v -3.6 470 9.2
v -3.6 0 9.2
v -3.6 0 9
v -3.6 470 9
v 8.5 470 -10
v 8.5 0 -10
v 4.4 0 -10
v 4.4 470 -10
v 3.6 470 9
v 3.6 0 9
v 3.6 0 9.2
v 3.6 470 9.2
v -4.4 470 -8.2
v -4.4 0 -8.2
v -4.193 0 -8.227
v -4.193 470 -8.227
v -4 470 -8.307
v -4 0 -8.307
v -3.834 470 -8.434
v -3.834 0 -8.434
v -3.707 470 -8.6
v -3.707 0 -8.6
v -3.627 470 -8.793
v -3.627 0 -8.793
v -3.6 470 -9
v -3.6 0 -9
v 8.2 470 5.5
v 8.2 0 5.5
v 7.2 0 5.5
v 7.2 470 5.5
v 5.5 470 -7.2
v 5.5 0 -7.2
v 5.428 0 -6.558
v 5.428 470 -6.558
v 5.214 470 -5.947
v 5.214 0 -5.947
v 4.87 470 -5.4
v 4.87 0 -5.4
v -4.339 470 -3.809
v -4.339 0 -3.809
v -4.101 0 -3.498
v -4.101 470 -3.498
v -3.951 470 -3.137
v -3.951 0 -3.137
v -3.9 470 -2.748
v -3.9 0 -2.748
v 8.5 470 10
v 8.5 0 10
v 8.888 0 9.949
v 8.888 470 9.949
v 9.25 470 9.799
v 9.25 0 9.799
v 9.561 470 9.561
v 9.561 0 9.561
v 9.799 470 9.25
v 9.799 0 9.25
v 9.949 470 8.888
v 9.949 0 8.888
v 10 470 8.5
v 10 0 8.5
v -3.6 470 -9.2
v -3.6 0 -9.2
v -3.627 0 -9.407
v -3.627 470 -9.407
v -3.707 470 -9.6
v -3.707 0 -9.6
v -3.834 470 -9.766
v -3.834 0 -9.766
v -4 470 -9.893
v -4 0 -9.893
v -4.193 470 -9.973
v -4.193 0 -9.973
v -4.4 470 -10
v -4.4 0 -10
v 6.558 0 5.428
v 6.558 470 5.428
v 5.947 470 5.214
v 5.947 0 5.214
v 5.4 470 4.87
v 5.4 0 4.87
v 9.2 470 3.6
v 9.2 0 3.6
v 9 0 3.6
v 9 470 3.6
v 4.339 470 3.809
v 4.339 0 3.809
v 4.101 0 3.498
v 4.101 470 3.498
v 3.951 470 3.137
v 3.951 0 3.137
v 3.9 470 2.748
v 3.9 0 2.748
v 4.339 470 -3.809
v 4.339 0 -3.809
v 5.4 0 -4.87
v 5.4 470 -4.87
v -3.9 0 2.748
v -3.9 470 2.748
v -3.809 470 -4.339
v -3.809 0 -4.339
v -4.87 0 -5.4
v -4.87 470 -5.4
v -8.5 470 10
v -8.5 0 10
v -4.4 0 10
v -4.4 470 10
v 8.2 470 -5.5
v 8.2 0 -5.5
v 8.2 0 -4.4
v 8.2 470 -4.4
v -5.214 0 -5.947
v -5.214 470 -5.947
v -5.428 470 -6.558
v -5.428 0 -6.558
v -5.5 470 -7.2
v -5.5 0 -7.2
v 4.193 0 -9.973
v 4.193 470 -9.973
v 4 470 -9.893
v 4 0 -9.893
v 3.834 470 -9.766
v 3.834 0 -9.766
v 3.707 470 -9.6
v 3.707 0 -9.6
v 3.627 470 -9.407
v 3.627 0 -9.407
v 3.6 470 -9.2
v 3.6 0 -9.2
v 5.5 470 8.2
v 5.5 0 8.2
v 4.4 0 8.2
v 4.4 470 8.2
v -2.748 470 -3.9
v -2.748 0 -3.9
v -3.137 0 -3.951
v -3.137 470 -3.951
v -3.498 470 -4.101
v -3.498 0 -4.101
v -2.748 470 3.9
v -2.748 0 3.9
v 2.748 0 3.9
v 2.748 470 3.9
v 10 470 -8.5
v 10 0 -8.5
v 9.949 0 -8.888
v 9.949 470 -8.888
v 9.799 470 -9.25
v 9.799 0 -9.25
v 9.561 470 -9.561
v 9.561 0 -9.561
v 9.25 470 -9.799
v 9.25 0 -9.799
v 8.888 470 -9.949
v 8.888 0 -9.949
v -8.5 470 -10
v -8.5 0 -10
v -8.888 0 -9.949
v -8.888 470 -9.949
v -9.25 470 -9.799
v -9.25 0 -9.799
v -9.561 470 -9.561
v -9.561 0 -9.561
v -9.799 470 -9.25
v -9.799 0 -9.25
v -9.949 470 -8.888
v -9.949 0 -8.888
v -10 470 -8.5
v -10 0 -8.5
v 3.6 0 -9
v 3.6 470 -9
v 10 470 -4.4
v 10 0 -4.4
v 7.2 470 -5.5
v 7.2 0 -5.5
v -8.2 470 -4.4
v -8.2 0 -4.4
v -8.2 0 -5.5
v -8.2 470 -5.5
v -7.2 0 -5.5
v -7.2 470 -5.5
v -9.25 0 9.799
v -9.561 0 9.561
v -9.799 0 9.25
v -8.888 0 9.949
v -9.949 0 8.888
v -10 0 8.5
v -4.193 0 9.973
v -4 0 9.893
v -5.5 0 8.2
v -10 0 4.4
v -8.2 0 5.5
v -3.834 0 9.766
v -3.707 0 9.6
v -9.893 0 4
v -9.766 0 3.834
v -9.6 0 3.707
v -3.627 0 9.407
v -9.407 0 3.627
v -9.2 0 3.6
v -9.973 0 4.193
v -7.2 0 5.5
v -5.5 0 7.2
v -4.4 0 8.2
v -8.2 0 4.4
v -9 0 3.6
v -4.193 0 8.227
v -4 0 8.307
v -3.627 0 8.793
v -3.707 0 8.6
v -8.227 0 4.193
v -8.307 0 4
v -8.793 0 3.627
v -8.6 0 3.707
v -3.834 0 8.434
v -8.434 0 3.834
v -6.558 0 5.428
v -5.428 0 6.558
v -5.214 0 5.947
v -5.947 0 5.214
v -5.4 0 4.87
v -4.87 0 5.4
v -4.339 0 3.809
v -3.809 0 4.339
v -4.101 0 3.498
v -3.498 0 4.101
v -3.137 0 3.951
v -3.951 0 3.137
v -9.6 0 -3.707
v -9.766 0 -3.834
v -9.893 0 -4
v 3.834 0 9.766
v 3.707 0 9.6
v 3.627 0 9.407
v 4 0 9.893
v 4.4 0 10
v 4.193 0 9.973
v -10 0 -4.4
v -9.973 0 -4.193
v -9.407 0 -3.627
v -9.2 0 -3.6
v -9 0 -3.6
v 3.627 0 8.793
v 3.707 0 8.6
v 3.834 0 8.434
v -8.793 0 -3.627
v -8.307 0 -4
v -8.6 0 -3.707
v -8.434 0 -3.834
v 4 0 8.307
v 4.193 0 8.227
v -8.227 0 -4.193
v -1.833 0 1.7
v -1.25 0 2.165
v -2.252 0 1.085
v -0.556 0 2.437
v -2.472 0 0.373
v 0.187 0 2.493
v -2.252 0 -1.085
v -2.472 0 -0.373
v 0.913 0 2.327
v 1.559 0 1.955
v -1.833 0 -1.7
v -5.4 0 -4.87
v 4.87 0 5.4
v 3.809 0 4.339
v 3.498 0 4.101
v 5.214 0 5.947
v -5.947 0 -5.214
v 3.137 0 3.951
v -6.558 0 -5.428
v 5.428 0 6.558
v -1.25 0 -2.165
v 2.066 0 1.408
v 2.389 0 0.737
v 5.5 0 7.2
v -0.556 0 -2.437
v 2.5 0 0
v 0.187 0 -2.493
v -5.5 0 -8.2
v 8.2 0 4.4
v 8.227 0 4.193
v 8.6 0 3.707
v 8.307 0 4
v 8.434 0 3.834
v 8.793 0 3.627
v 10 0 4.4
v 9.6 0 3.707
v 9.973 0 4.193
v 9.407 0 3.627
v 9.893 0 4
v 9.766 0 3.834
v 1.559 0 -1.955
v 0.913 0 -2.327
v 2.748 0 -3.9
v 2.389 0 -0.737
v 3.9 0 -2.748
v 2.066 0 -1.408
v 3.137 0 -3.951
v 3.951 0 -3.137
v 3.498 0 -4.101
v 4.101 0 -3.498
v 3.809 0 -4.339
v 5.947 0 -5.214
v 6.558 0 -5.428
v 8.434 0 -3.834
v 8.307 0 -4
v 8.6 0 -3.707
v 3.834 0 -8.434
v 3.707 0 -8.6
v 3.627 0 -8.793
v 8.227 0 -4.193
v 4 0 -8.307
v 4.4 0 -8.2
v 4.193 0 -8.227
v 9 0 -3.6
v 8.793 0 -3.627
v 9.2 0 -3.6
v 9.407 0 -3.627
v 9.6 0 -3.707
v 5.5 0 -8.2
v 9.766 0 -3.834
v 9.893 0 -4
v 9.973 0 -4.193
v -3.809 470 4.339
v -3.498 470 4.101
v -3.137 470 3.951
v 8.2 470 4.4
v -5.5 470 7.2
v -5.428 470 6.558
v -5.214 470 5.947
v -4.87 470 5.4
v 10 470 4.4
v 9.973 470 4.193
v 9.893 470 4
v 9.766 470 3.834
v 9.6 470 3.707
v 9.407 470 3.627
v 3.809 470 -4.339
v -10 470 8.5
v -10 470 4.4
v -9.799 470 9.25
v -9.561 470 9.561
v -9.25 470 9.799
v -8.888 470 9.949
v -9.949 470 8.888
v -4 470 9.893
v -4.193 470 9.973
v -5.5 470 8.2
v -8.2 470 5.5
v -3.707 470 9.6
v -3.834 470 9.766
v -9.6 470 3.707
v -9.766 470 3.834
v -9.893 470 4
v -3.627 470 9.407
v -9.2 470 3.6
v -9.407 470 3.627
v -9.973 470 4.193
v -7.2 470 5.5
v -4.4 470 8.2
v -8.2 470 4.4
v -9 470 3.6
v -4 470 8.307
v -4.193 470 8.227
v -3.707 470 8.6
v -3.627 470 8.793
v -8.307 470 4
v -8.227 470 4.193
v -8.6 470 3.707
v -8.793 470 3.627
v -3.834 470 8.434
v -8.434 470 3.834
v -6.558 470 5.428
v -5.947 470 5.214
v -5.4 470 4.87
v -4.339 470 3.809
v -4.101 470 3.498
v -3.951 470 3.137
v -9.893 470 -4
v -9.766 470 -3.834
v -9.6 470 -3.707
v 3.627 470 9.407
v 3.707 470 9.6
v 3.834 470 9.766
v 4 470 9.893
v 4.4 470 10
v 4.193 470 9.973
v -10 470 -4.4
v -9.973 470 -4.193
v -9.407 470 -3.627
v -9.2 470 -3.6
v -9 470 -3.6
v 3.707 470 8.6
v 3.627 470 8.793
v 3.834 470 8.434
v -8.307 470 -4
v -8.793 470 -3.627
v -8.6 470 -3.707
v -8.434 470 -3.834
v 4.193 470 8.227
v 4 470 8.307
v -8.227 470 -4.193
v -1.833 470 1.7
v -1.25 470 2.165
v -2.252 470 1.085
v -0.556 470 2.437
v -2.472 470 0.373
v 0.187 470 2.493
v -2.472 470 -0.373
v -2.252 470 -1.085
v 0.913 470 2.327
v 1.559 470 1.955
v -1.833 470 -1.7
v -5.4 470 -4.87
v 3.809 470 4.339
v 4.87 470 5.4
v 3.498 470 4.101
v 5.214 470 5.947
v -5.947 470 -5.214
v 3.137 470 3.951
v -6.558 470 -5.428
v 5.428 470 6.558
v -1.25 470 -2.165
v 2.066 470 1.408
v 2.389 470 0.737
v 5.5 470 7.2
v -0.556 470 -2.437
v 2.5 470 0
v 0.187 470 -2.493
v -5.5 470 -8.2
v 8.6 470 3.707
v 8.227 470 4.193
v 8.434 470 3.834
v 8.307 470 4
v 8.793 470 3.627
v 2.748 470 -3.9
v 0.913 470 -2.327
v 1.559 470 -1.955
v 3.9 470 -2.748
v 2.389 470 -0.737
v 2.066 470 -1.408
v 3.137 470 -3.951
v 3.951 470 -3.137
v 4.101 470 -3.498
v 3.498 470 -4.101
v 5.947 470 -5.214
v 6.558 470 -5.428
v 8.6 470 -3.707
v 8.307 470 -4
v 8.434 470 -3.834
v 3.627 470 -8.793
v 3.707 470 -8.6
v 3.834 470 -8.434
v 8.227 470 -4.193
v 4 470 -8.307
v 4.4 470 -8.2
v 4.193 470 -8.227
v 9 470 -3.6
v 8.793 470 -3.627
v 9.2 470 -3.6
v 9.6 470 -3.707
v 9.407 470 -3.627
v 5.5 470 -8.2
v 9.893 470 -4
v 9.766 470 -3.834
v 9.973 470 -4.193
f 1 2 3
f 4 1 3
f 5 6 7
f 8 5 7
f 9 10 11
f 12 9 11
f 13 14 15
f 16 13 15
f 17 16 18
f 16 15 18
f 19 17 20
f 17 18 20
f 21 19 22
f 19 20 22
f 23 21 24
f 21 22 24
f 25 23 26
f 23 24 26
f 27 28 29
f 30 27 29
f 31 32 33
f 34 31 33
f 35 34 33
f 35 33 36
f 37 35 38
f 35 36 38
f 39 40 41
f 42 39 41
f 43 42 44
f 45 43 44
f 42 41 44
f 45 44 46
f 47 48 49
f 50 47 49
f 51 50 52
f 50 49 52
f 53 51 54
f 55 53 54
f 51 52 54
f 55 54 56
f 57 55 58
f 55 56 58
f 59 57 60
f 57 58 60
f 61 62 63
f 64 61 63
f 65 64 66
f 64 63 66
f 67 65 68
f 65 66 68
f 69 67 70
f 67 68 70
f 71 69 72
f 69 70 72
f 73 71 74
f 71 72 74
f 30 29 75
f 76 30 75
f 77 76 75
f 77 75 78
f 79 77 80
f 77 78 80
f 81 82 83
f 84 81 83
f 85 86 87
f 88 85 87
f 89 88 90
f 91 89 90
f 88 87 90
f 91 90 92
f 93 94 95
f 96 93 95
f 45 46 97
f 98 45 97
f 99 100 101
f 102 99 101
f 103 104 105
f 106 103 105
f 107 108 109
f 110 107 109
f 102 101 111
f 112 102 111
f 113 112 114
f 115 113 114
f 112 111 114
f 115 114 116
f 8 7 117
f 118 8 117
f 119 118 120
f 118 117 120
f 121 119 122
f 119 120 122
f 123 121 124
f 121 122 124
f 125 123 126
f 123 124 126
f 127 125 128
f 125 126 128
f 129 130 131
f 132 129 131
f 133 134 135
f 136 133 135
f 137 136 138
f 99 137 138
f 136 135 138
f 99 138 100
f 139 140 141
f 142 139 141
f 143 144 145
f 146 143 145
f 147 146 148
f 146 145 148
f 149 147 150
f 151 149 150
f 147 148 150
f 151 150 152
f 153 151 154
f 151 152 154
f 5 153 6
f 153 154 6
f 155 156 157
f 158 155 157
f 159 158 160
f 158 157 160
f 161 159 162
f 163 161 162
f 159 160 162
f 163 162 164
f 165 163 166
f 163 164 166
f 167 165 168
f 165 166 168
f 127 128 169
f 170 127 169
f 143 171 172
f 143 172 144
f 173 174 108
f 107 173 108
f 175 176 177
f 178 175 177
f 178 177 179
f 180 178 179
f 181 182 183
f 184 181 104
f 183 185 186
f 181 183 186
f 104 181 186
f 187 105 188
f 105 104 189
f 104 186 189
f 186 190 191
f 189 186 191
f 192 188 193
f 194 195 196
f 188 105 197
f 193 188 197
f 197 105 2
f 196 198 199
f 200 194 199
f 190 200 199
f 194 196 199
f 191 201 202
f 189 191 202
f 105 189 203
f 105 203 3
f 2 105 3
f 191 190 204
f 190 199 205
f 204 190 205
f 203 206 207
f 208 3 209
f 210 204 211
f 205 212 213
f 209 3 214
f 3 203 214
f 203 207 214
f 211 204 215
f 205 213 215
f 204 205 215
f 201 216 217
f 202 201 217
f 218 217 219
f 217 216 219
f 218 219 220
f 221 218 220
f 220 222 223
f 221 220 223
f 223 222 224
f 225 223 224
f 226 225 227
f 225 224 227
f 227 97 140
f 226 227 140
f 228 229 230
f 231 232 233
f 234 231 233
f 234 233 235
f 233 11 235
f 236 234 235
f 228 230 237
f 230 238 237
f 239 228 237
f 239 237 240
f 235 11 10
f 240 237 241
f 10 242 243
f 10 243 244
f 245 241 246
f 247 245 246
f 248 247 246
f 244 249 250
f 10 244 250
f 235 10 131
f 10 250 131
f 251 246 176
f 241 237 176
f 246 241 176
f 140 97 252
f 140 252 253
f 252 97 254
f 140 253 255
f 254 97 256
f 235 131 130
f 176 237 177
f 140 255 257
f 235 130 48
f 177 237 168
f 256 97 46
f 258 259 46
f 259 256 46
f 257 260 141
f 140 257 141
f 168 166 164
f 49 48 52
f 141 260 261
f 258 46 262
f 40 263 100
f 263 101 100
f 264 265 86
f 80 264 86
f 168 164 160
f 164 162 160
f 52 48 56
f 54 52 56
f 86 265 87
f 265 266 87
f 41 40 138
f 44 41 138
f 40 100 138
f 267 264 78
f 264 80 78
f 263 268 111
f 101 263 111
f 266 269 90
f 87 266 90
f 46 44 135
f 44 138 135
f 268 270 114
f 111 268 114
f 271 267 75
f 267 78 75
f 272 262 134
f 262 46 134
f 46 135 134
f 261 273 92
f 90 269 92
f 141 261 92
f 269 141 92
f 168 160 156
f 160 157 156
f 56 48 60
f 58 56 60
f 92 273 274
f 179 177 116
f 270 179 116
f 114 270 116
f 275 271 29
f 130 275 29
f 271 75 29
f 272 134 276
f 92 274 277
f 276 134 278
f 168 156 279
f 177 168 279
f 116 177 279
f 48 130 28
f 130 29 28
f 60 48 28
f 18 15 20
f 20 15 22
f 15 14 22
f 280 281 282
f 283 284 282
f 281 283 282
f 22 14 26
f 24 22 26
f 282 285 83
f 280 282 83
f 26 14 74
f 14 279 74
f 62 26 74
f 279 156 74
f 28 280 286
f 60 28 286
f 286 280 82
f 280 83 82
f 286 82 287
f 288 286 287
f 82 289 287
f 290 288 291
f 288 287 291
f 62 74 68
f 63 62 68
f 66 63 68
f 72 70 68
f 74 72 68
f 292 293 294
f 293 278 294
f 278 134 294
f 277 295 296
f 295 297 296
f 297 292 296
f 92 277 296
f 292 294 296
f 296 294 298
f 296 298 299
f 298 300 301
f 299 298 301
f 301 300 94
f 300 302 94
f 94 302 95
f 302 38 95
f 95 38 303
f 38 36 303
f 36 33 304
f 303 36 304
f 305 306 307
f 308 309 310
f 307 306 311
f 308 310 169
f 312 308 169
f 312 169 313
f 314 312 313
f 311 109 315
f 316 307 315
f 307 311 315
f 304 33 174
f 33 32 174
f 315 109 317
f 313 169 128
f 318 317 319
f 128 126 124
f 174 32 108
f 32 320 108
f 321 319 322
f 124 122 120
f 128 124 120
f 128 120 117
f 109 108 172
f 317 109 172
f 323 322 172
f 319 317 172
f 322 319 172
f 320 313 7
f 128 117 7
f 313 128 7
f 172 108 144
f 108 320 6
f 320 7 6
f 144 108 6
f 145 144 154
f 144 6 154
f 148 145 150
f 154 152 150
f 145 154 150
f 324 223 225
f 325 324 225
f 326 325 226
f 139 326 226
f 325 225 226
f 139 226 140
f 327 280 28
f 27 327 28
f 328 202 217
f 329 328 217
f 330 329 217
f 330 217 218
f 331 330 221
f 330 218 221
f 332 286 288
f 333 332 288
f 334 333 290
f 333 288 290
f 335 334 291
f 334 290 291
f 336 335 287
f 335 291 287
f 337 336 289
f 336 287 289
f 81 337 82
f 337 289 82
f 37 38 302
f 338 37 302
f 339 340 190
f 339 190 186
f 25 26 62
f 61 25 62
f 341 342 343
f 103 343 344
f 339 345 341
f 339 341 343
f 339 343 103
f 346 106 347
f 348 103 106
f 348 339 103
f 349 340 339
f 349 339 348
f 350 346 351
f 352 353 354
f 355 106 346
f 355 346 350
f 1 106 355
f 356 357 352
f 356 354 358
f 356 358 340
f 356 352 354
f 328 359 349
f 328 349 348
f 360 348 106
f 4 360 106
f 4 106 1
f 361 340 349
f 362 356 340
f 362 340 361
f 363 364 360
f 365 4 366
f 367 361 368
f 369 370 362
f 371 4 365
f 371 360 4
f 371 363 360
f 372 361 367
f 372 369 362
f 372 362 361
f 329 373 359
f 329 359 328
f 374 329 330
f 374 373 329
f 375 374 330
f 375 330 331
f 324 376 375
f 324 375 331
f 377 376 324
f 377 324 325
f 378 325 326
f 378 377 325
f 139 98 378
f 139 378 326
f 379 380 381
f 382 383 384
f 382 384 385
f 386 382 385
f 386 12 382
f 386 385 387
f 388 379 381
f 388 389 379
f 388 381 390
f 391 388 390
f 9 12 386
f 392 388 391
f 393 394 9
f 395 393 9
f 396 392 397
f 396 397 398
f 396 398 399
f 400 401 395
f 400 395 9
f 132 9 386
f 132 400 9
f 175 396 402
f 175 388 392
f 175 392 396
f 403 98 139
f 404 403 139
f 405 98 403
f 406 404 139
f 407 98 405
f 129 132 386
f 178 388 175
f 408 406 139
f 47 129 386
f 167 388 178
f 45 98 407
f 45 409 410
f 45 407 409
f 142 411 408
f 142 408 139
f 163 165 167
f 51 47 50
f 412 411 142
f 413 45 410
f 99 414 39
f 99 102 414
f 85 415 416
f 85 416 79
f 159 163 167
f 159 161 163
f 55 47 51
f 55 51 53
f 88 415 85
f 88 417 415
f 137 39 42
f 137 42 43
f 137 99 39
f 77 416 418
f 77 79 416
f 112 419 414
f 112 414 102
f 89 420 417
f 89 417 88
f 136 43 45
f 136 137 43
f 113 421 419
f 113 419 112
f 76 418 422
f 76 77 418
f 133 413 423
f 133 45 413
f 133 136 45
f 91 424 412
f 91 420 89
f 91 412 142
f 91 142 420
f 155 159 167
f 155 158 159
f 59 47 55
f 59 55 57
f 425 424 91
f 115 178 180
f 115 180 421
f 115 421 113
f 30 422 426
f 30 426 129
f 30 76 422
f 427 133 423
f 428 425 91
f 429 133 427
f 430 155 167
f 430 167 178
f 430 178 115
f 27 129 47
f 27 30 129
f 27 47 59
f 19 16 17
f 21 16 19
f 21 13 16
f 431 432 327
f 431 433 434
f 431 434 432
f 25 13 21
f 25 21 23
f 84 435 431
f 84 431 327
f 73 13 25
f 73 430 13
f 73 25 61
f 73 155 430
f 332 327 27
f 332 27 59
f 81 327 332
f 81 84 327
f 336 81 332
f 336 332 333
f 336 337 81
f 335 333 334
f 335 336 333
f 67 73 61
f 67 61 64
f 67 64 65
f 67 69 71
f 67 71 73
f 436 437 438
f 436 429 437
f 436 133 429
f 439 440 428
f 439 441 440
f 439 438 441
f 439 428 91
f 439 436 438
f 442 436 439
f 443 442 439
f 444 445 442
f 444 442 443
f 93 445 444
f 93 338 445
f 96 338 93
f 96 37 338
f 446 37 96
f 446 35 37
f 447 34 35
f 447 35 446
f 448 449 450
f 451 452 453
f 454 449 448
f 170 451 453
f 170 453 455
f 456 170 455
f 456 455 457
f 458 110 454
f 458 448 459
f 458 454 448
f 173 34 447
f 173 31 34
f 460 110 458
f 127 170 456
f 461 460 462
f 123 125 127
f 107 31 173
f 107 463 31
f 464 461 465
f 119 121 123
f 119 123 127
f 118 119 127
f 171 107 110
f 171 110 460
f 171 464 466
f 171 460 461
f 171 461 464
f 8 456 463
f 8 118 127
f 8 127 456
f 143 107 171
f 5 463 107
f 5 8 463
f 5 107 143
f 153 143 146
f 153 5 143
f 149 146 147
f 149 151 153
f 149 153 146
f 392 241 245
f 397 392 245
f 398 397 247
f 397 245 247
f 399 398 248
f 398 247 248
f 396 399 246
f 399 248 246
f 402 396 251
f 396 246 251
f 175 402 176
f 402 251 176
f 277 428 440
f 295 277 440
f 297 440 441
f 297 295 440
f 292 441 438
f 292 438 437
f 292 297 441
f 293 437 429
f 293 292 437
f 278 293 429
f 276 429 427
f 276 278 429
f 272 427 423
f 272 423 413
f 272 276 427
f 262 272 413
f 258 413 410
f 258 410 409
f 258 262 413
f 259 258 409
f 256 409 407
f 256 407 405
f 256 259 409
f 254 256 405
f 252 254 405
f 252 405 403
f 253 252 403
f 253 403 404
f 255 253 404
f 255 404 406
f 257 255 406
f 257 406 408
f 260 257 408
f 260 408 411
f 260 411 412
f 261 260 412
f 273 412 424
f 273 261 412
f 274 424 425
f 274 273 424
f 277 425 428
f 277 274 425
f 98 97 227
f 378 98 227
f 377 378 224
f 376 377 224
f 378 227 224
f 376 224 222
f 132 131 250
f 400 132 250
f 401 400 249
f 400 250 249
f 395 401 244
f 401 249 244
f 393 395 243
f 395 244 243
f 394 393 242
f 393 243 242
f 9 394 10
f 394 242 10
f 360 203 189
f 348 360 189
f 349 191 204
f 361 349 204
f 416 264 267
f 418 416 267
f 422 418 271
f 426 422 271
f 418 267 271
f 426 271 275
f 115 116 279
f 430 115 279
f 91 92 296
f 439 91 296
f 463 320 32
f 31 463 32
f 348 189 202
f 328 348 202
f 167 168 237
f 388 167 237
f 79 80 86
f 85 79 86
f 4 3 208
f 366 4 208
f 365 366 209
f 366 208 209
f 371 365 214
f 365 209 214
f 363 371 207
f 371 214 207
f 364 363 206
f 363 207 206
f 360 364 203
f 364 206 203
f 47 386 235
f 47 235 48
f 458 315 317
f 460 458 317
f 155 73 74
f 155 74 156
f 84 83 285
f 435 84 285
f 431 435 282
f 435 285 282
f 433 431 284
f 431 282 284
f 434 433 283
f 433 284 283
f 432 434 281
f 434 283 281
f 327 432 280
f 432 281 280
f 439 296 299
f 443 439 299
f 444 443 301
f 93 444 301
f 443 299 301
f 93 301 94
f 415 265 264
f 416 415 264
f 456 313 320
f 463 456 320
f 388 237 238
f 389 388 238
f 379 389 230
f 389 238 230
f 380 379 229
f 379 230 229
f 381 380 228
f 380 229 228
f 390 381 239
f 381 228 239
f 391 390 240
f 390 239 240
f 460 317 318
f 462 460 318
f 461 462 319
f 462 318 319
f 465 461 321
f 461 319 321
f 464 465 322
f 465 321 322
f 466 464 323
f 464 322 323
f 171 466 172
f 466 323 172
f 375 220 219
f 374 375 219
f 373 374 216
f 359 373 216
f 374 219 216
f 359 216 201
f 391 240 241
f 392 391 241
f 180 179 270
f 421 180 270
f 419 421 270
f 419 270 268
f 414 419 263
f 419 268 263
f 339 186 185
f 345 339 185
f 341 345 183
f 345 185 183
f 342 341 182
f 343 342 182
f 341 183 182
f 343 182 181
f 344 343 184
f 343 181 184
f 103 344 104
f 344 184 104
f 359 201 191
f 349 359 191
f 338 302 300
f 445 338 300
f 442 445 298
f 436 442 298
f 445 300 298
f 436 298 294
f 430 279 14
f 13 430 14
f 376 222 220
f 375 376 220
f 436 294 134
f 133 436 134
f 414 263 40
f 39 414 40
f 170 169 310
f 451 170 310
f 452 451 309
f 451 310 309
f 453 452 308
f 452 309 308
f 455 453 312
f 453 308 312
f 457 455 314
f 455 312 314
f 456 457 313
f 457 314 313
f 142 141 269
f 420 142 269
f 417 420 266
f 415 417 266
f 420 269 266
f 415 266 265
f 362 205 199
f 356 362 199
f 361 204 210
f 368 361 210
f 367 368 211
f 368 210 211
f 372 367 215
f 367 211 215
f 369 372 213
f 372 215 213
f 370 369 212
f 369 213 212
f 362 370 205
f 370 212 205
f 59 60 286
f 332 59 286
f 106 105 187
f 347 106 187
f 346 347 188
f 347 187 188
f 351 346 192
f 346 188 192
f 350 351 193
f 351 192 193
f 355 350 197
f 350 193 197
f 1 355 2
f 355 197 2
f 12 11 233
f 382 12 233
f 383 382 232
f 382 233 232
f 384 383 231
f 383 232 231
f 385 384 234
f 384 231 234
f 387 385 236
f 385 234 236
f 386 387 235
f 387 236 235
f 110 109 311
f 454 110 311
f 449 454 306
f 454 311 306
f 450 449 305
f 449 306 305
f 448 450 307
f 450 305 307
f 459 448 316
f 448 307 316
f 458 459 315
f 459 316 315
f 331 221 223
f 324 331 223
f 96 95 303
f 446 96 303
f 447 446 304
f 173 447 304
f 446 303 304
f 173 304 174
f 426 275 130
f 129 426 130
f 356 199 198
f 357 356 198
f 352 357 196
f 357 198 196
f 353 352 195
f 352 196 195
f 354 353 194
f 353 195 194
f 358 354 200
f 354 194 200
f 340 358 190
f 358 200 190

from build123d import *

# Parameters (mm, degrees)
SKETCH2_R           = 2.5
BOSS_EXTRUDE1_DEPTH = 470


with BuildPart() as part:
    # Sketch2 → Boss-Extrude1 (new body)
    with BuildSketch(Plane(origin=(0, 0, 0), x_dir=(1, 0, 0), z_dir=(0, 1, 0))):
        with BuildLine():
            Line((-5.4, 4.869669914), (-4.339339828, 3.809009742))
            ThreePointArc((-4.339339828, 3.809009742), (-4.014180701, 3.322374719), (-3.9, 2.748349571))
            Line((-3.9, 2.748349571), (-3.9, -2.748349571))
            ThreePointArc((-3.9, -2.748349571), (-4.014180701, -3.322374719), (-4.339339828, -3.809009742))
            Line((-4.339339828, -3.809009742), (-5.4, -4.869669914))
            ThreePointArc((-5.4, -4.869669914), (-6.246412561, -5.337861749), (-7.2, -5.5))
            Line((-7.2, -5.5), (-8.2, -5.5))
            Line((-8.2, -5.5), (-8.2, -4.4))
            ThreePointArc((-8.2, -4.4), (-8.434314575, -3.834314575), (-9, -3.6))
            Line((-9, -3.6), (-9.2, -3.6))
            ThreePointArc((-9.2, -3.6), (-9.765685425, -3.834314575), (-10, -4.4))
            Line((-10, -4.4), (-10, -8.5))
            ThreePointArc((-10, -8.5), (-9.560660172, -9.560660172), (-8.5, -10))
            Line((-8.5, -10), (-4.4, -10))
            ThreePointArc((-4.4, -10), (-3.834314575, -9.765685425), (-3.6, -9.2))
            Line((-3.6, -9.2), (-3.6, -9))
            ThreePointArc((-3.6, -9), (-3.834314575, -8.434314575), (-4.4, -8.2))
            Line((-4.4, -8.2), (-5.5, -8.2))
            Line((-5.5, -8.2), (-5.5, -7.2))
            ThreePointArc((-5.5, -7.2), (-5.337861749, -6.246412561), (-4.869669914, -5.4))
            Line((-4.869669914, -5.4), (-3.809009742, -4.339339828))
            ThreePointArc((-3.809009742, -4.339339828), (-3.322374719, -4.014180701), (-2.748349571, -3.9))
            Line((-2.748349571, -3.9), (2.748349571, -3.9))
            ThreePointArc((2.748349571, -3.9), (3.322374719, -4.014180701), (3.809009742, -4.339339828))
            Line((3.809009742, -4.339339828), (4.869669914, -5.4))
            ThreePointArc((4.869669914, -5.4), (5.337861749, -6.246412561), (5.5, -7.2))
            Line((5.5, -7.2), (5.5, -8.2))
            Line((5.5, -8.2), (4.4, -8.2))
            ThreePointArc((4.4, -8.2), (3.834314575, -8.434314575), (3.6, -9))
            Line((3.6, -9), (3.6, -9.2))
            ThreePointArc((3.6, -9.2), (3.834314575, -9.765685425), (4.4, -10))
            Line((4.4, -10), (8.5, -10))
            ThreePointArc((8.5, -10), (9.560660172, -9.560660172), (10, -8.5))
            Line((10, -8.5), (10, -4.4))
            ThreePointArc((10, -4.4), (9.765685425, -3.834314575), (9.2, -3.6))
            Line((9.2, -3.6), (9, -3.6))
            ThreePointArc((9, -3.6), (8.434314575, -3.834314575), (8.2, -4.4))
            Line((8.2, -4.4), (8.2, -5.5))
            Line((8.2, -5.5), (7.2, -5.5))
            ThreePointArc((7.2, -5.5), (6.246412561, -5.337861749), (5.4, -4.869669914))
            Line((5.4, -4.869669914), (4.339339828, -3.809009742))
            ThreePointArc((4.339339828, -3.809009742), (4.014180701, -3.322374719), (3.9, -2.748349571))
            Line((3.9, -2.748349571), (3.9, 2.748349571))
            ThreePointArc((3.9, 2.748349571), (4.014180701, 3.322374719), (4.339339828, 3.809009742))
            Line((4.339339828, 3.809009742), (5.4, 4.869669914))
            ThreePointArc((5.4, 4.869669914), (6.246412561, 5.337861749), (7.2, 5.5))
            Line((7.2, 5.5), (8.2, 5.5))
            Line((8.2, 5.5), (8.2, 4.4))
            ThreePointArc((8.2, 4.4), (8.434314575, 3.834314575), (9, 3.6))
            Line((9, 3.6), (9.2, 3.6))
            ThreePointArc((9.2, 3.6), (9.765685425, 3.834314575), (10, 4.4))
            Line((10, 4.4), (10, 8.5))
            ThreePointArc((10, 8.5), (9.560660172, 9.560660172), (8.5, 10))
            Line((8.5, 10), (4.4, 10))
            ThreePointArc((4.4, 10), (3.834314575, 9.765685425), (3.6, 9.2))
            Line((3.6, 9.2), (3.6, 9))
            ThreePointArc((3.6, 9), (3.834314575, 8.434314575), (4.4, 8.2))
            Line((4.4, 8.2), (5.5, 8.2))
            Line((5.5, 8.2), (5.5, 7.2))
            ThreePointArc((5.5, 7.2), (5.337861749, 6.246412561), (4.869669914, 5.4))
            Line((4.869669914, 5.4), (3.809009742, 4.339339828))
            ThreePointArc((3.809009742, 4.339339828), (3.322374719, 4.014180701), (2.748349571, 3.9))
            Line((2.748349571, 3.9), (-2.748349571, 3.9))
            ThreePointArc((-2.748349571, 3.9), (-3.322374719, 4.014180701), (-3.809009742, 4.339339828))
            Line((-3.809009742, 4.339339828), (-4.869669914, 5.4))
            ThreePointArc((-4.869669914, 5.4), (-5.337861749, 6.246412561), (-5.5, 7.2))
            Line((-5.5, 7.2), (-5.5, 8.2))
            Line((-5.5, 8.2), (-4.4, 8.2))
            ThreePointArc((-4.4, 8.2), (-3.834314575, 8.434314575), (-3.6, 9))
            Line((-3.6, 9), (-3.6, 9.2))
            ThreePointArc((-3.6, 9.2), (-3.834314575, 9.765685425), (-4.4, 10))
            Line((-4.4, 10), (-8.5, 10))
            ThreePointArc((-8.5, 10), (-9.560660172, 9.560660172), (-10, 8.5))
            Line((-10, 8.5), (-10, 4.4))
            ThreePointArc((-10, 4.4), (-9.765685425, 3.834314575), (-9.2, 3.6))
            Line((-9.2, 3.6), (-9, 3.6))
            ThreePointArc((-9, 3.6), (-8.434314575, 3.834314575), (-8.2, 4.4))
            Line((-8.2, 4.4), (-8.2, 5.5))
            Line((-8.2, 5.5), (-7.2, 5.5))
            ThreePointArc((-7.2, 5.5), (-6.246412561, 5.337861749), (-5.4, 4.869669914))
        make_face()
        Circle(SKETCH2_R, mode=Mode.SUBTRACT)
    extrude(amount=BOSS_EXTRUDE1_DEPTH)


solid = part.part
